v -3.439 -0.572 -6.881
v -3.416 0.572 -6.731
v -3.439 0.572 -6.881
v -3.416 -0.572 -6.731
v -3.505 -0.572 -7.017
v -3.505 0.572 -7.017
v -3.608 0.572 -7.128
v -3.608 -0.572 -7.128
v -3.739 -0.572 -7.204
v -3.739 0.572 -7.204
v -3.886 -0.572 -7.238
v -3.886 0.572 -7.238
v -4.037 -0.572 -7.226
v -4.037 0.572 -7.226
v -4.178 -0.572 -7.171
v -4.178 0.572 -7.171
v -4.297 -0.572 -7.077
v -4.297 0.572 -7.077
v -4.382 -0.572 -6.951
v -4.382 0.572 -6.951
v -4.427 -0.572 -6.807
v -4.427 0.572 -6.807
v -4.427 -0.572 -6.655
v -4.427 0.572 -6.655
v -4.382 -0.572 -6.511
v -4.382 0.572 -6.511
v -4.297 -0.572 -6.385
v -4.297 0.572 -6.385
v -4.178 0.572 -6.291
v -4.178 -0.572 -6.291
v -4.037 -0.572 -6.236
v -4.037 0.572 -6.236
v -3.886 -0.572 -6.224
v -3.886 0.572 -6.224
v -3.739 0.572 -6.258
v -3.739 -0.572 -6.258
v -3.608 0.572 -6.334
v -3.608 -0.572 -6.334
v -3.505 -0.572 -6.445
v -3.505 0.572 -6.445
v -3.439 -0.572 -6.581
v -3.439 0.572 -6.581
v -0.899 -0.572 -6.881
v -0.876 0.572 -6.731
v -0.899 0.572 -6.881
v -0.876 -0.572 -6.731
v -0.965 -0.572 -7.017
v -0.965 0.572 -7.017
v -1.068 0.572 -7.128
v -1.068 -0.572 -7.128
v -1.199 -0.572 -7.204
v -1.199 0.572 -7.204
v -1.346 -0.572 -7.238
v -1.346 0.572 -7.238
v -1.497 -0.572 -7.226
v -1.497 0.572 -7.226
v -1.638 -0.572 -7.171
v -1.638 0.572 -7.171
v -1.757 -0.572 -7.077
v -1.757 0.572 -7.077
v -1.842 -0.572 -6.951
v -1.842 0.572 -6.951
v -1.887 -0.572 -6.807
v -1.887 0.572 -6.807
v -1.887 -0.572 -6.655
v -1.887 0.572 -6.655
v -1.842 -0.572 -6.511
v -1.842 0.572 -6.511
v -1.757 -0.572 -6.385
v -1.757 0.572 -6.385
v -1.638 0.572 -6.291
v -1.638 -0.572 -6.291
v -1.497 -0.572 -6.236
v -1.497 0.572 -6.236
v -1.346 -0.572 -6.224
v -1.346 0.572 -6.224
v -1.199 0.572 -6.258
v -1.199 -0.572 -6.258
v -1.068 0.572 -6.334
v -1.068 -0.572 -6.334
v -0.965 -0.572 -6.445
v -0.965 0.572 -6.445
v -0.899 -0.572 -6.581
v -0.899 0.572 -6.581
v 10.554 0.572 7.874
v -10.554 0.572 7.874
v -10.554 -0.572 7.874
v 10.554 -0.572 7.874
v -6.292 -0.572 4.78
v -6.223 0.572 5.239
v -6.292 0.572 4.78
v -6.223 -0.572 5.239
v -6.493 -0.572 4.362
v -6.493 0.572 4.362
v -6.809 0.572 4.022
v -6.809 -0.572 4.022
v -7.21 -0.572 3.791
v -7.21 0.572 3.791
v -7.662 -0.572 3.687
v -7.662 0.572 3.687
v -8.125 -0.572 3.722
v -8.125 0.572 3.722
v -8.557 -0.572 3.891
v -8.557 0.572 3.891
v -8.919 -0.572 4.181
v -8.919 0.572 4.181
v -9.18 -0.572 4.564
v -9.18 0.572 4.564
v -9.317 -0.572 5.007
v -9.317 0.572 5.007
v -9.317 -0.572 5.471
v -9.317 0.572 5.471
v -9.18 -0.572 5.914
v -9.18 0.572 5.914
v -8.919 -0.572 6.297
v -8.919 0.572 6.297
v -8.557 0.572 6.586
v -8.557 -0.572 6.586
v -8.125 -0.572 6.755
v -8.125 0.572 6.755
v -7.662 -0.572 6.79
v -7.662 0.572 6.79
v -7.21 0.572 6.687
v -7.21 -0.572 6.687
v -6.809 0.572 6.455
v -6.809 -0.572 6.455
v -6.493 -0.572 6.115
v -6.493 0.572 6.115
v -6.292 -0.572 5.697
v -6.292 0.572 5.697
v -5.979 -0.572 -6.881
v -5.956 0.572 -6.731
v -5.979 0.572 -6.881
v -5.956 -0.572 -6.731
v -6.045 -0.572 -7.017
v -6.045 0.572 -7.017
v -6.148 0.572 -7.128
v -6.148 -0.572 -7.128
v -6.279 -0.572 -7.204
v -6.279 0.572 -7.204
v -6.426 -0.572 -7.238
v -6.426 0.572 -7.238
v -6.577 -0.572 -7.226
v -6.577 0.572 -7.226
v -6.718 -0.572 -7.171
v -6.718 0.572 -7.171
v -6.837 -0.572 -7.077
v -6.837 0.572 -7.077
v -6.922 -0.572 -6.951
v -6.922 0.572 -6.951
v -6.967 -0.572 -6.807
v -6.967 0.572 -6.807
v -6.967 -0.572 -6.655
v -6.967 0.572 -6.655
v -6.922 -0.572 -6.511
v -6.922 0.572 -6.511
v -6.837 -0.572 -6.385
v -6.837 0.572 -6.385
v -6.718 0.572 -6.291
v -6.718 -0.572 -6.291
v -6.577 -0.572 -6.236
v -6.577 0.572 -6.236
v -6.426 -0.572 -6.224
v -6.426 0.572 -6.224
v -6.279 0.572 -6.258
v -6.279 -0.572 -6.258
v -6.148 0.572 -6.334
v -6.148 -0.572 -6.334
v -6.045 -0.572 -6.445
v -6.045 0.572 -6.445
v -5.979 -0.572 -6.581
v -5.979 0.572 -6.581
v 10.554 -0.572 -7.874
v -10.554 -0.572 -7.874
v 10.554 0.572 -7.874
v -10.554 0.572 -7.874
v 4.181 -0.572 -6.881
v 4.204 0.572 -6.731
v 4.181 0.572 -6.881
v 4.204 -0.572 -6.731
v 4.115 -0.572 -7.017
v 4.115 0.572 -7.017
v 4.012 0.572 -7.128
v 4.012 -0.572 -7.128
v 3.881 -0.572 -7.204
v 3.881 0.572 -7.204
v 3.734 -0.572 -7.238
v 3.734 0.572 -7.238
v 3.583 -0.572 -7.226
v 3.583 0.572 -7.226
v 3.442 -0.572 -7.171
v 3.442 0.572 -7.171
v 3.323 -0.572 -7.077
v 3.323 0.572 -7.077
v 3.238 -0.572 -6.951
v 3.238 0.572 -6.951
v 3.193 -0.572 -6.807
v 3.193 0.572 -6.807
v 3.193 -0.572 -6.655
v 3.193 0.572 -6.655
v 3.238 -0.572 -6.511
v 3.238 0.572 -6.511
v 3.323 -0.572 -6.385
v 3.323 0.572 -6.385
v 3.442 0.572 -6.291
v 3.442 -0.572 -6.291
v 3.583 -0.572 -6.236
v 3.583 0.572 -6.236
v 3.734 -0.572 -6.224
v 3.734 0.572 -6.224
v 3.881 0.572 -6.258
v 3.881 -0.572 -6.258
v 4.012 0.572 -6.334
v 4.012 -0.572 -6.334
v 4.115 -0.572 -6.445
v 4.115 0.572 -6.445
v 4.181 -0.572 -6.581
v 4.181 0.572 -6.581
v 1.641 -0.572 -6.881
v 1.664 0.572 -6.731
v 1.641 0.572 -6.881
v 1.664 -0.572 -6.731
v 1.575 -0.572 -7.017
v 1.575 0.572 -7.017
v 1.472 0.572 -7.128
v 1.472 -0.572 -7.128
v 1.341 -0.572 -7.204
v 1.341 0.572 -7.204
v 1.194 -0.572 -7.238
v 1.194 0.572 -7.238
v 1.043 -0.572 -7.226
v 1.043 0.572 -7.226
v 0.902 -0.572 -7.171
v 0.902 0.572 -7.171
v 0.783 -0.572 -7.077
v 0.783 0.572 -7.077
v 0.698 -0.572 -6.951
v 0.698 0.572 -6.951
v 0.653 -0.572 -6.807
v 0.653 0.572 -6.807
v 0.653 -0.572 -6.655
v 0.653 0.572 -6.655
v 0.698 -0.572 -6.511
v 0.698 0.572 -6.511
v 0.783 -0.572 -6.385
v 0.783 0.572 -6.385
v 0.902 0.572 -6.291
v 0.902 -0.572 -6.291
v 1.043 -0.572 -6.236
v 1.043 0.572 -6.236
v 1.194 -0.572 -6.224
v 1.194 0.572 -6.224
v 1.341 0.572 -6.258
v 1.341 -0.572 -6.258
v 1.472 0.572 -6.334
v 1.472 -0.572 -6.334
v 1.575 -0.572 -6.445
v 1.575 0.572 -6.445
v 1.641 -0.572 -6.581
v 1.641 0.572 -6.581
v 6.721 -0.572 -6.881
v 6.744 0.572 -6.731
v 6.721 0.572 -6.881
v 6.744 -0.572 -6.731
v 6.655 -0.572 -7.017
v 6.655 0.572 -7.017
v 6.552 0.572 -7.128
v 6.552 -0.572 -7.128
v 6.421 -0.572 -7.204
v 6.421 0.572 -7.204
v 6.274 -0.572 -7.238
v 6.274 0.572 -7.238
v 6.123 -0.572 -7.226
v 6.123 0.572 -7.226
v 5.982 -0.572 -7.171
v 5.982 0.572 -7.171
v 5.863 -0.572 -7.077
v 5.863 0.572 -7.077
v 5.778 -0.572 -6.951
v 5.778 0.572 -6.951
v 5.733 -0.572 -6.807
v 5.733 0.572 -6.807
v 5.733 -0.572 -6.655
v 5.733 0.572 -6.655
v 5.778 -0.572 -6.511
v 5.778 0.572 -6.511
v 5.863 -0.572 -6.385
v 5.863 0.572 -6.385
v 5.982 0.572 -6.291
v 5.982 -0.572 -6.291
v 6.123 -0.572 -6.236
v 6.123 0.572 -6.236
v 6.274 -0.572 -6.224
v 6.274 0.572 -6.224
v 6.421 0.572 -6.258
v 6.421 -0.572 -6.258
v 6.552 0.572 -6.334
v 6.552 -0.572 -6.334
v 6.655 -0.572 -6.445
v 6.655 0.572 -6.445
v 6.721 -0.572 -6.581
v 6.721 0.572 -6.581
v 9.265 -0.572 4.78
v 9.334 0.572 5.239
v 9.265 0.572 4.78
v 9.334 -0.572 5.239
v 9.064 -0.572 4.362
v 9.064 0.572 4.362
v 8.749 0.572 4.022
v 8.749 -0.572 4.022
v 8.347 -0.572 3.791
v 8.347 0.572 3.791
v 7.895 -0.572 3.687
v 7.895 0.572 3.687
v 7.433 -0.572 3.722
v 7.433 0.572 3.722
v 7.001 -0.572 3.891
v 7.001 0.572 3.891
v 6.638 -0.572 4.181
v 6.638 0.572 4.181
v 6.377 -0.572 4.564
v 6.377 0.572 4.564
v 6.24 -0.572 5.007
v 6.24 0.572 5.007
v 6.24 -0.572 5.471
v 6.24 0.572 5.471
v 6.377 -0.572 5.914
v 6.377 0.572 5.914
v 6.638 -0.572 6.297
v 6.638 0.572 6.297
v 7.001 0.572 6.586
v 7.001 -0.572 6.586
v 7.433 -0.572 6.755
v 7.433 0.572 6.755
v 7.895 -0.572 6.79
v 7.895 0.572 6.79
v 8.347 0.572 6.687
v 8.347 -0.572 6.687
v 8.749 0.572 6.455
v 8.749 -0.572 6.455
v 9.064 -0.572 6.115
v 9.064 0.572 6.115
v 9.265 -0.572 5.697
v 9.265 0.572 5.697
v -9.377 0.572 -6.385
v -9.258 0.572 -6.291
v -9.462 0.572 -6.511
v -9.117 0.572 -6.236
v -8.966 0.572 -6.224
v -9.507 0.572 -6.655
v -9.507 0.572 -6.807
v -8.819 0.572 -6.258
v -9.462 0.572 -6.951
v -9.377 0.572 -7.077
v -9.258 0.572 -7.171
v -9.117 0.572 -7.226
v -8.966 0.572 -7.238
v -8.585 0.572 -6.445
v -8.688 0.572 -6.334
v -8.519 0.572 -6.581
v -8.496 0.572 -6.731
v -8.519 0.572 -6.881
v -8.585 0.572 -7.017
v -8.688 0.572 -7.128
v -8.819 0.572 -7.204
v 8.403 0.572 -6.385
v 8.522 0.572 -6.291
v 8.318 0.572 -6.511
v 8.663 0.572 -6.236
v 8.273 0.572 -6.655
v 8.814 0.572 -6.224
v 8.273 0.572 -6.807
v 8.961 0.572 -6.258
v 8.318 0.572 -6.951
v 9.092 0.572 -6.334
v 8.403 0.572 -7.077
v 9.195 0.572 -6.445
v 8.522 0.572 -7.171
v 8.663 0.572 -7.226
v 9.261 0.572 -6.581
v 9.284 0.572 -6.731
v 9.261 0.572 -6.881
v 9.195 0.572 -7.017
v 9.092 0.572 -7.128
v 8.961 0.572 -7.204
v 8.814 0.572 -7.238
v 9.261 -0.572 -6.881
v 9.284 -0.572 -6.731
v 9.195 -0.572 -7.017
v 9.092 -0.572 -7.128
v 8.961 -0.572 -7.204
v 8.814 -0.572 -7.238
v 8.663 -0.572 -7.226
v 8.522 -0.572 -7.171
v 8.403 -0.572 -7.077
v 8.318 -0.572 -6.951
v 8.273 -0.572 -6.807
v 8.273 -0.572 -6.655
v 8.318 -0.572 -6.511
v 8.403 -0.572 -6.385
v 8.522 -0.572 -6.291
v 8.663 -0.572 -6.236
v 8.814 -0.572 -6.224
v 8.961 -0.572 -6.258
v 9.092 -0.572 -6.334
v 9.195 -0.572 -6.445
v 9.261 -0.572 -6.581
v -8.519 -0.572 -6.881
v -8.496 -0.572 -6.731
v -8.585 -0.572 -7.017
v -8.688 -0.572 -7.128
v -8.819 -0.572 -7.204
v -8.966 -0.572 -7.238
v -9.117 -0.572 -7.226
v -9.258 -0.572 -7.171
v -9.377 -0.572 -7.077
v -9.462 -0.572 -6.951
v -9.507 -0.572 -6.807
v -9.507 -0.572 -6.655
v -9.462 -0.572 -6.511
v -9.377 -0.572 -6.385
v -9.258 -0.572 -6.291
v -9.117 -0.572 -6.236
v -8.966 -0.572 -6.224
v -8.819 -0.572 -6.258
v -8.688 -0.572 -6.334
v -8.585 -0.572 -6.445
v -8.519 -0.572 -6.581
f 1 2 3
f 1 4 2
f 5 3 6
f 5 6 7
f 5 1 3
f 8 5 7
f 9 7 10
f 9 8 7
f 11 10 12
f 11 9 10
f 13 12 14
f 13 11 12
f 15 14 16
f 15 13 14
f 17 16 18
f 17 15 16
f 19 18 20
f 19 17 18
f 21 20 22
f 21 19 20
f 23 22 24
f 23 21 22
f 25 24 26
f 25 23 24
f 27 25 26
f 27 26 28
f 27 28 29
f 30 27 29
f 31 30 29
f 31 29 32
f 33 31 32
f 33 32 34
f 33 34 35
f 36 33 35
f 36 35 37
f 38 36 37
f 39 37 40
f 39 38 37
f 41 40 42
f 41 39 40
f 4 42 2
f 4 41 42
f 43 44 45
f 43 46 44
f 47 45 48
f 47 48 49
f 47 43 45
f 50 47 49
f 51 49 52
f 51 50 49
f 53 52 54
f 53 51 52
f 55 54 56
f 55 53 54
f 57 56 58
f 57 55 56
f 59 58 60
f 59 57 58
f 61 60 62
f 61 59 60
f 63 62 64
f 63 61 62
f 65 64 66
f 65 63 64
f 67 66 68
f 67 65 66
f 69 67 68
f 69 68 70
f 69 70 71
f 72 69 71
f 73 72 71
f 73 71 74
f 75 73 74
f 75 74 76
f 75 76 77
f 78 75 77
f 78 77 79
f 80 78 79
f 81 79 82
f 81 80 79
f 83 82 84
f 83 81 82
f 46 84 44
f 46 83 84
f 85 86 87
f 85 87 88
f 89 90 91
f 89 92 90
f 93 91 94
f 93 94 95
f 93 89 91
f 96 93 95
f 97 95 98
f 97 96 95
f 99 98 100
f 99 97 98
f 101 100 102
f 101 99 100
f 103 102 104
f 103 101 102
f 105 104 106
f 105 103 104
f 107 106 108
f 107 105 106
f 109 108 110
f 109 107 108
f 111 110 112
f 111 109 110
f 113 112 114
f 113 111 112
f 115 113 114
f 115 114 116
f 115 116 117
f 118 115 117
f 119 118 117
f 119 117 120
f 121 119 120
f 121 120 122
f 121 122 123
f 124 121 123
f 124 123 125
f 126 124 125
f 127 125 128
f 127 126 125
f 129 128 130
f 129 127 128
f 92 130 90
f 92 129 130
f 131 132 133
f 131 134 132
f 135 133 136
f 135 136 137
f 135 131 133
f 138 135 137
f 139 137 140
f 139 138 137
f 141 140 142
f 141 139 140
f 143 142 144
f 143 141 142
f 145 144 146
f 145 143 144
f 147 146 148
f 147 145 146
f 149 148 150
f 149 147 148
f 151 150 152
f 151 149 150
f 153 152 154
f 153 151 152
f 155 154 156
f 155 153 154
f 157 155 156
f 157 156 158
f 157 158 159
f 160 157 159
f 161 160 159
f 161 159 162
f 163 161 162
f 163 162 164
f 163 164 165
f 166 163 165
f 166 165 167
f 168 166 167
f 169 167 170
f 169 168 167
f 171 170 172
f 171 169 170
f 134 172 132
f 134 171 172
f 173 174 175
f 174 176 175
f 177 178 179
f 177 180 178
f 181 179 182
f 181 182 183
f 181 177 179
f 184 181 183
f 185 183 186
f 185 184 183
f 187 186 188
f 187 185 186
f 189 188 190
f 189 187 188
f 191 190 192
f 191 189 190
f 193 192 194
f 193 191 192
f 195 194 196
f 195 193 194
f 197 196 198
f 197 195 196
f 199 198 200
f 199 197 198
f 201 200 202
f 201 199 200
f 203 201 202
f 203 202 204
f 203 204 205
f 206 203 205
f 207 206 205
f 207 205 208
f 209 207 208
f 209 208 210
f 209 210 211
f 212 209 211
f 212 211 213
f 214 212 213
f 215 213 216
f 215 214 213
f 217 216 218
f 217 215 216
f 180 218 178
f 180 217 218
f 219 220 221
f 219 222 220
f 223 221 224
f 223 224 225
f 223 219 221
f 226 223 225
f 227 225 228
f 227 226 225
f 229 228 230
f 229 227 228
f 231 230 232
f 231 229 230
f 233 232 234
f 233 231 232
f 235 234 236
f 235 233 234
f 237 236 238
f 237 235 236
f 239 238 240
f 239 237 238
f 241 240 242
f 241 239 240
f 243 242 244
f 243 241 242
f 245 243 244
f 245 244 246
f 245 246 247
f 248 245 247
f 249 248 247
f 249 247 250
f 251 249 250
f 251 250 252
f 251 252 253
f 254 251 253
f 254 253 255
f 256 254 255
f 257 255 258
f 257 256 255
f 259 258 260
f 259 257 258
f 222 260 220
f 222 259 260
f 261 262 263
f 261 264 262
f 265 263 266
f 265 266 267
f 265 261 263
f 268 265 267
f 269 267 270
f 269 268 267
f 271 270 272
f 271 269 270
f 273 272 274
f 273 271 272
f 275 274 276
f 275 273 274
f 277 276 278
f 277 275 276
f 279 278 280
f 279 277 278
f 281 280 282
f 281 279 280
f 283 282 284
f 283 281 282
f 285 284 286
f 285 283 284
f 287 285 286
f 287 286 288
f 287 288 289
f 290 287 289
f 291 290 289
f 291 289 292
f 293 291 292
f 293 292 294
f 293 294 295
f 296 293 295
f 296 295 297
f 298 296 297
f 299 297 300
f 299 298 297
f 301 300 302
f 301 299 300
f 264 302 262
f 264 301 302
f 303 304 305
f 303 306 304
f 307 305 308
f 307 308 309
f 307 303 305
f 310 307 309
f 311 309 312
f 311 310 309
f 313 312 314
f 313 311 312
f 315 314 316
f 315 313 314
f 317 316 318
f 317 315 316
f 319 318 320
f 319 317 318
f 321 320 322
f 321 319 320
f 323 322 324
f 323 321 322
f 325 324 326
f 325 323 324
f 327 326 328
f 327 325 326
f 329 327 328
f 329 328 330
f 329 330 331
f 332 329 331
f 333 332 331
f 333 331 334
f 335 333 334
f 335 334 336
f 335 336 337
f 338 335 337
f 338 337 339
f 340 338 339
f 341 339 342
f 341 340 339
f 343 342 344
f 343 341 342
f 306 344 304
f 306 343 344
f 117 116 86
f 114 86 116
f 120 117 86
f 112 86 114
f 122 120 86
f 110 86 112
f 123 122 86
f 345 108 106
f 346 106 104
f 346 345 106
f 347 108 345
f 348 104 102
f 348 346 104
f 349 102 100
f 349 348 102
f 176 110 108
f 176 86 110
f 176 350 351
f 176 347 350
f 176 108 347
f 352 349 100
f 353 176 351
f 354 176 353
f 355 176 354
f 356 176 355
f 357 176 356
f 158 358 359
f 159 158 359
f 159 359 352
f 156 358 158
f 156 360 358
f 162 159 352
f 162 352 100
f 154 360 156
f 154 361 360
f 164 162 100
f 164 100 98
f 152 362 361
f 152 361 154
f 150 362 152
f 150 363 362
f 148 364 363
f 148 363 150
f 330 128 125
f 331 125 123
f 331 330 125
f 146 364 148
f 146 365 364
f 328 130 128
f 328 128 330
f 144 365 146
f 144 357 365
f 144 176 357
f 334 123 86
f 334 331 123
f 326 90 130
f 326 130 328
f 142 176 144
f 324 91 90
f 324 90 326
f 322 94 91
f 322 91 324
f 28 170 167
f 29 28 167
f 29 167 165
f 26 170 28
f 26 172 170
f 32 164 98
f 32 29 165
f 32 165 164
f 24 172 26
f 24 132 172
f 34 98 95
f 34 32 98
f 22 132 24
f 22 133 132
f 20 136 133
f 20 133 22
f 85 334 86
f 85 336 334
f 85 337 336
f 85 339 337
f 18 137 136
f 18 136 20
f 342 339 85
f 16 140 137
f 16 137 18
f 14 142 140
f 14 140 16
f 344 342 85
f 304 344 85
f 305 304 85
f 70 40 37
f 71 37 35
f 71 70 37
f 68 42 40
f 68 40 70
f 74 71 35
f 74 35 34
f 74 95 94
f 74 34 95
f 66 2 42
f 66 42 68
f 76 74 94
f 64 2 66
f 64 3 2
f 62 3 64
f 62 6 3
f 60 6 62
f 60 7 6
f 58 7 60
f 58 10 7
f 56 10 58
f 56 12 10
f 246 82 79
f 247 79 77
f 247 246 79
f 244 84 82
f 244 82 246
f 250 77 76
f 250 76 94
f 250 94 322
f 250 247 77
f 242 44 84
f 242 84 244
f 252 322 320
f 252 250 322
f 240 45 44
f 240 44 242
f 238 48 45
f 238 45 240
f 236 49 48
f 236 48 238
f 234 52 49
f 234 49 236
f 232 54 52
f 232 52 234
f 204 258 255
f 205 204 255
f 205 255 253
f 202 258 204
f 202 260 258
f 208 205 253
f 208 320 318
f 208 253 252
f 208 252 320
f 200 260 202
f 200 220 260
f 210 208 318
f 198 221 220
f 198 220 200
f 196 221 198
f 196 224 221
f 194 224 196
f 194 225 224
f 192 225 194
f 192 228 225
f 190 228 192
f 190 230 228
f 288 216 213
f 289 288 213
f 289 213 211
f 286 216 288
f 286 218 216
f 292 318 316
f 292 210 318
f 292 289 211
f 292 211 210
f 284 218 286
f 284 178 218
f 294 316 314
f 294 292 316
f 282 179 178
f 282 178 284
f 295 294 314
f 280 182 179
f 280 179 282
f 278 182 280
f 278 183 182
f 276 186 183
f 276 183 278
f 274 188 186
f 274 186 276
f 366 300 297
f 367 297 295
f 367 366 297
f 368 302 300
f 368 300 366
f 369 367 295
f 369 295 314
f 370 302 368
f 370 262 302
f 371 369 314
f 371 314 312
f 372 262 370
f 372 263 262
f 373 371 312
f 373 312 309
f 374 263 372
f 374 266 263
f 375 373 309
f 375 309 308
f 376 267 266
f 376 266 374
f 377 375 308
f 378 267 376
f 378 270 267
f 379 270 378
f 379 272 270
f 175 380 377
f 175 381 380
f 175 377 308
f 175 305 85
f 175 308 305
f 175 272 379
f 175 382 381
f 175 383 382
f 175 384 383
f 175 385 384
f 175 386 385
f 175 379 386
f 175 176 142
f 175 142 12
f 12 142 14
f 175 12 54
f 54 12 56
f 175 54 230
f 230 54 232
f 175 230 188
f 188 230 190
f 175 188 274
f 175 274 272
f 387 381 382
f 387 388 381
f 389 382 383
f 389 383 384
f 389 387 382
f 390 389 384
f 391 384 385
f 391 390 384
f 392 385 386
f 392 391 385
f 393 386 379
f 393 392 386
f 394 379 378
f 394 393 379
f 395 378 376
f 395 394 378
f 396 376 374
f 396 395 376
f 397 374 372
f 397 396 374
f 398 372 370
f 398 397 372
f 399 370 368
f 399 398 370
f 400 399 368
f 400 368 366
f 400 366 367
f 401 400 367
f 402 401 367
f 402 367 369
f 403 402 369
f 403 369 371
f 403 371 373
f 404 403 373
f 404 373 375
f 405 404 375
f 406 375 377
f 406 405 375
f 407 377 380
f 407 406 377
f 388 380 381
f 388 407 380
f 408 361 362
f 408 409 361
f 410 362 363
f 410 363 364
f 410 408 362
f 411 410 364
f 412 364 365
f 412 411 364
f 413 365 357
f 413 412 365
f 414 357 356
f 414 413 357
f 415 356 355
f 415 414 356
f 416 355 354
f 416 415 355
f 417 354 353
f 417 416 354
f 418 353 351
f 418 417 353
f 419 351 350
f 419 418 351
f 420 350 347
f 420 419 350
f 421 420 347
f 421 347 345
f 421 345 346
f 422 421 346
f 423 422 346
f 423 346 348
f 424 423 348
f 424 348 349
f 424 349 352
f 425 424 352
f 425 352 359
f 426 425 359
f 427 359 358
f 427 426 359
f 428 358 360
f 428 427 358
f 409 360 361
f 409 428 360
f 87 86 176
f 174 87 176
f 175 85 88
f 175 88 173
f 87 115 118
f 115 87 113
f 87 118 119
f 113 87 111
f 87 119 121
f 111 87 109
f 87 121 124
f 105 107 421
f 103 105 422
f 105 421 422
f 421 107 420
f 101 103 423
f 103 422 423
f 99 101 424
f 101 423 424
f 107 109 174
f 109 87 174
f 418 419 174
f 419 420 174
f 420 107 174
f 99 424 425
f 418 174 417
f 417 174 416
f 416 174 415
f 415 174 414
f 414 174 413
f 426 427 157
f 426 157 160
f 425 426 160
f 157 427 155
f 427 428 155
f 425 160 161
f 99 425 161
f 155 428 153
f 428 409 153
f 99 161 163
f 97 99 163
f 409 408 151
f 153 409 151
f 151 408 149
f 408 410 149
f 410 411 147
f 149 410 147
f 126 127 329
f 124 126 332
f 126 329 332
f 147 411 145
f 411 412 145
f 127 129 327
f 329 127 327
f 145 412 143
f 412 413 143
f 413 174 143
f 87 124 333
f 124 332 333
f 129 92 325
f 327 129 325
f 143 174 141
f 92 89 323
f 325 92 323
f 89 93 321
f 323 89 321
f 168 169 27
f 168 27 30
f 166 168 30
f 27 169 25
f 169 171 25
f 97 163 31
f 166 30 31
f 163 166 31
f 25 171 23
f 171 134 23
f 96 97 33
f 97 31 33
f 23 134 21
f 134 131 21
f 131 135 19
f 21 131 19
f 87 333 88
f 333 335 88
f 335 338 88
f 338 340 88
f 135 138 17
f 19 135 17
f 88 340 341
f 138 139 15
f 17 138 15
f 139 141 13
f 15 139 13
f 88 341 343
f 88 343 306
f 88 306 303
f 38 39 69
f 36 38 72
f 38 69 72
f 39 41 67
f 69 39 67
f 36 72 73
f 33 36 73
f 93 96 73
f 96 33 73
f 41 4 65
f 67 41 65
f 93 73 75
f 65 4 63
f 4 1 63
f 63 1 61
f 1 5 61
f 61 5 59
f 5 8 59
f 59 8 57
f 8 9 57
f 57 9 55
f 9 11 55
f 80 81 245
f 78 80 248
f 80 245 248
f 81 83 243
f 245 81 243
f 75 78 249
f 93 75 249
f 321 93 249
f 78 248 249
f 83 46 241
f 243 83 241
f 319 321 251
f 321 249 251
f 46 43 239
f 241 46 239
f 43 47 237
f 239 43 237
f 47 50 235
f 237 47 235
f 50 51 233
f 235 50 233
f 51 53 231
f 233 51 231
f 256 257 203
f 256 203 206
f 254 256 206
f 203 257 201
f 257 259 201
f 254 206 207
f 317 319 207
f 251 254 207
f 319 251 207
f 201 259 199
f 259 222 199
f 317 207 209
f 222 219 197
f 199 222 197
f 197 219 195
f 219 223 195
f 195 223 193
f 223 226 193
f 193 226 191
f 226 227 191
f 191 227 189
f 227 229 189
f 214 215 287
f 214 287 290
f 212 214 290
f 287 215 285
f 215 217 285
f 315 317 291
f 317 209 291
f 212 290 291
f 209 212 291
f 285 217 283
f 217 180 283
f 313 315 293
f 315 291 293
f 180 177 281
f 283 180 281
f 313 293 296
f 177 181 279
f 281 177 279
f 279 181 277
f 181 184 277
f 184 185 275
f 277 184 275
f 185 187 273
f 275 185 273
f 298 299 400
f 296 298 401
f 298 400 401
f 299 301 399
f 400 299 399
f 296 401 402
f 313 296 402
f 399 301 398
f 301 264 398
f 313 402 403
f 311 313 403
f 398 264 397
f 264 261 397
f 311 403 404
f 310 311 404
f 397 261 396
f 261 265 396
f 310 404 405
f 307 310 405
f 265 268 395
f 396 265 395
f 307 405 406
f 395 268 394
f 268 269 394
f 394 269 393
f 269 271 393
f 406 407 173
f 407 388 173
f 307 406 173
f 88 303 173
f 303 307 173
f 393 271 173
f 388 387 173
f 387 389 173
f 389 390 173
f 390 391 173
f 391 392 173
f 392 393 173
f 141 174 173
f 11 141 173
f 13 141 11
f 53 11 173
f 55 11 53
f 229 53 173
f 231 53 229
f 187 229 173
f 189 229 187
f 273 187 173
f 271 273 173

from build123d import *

# Parameters (mm, degrees)
SKETCH1_W           = 21.1074
SKETCH1_H           = 15.748
SKETCH1_R           = 1.55575
SKETCH1_R_2         = 0.508
BOSS_EXTRUDE1_DEPTH = 0.5715


with BuildPart() as part:
    # Sketch1 → Boss-Extrude1 (new body, symmetric)
    with BuildSketch(Plane(origin=(0, 0, 0), x_dir=(1, 0, 0), z_dir=(0, 1, 0))):
        Rectangle(SKETCH1_W, SKETCH1_H)
        with Locations((-7.77875, -5.23875)):
            Circle(SKETCH1_R, mode=Mode.SUBTRACT)
        with Locations((7.77875, -5.23875)):
            Circle(SKETCH1_R, mode=Mode.SUBTRACT)
        with Locations((-9.0043, 6.731)):
            Circle(SKETCH1_R_2, mode=Mode.SUBTRACT)
        with Locations((-6.4643, 6.731)):
            Circle(SKETCH1_R_2, mode=Mode.SUBTRACT)
        with Locations((-3.9243, 6.731)):
            Circle(SKETCH1_R_2, mode=Mode.SUBTRACT)
        with Locations((-1.3843, 6.731)):
            Circle(SKETCH1_R_2, mode=Mode.SUBTRACT)
        with Locations((1.1557, 6.731)):
            Circle(SKETCH1_R_2, mode=Mode.SUBTRACT)
        with Locations((3.6957, 6.731)):
            Circle(SKETCH1_R_2, mode=Mode.SUBTRACT)
        with Locations((6.2357, 6.731)):
            Circle(SKETCH1_R_2, mode=Mode.SUBTRACT)
        with Locations((8.7757, 6.731)):
            Circle(SKETCH1_R_2, mode=Mode.SUBTRACT)
    extrude(amount=BOSS_EXTRUDE1_DEPTH, both=True)


solid = part.part
